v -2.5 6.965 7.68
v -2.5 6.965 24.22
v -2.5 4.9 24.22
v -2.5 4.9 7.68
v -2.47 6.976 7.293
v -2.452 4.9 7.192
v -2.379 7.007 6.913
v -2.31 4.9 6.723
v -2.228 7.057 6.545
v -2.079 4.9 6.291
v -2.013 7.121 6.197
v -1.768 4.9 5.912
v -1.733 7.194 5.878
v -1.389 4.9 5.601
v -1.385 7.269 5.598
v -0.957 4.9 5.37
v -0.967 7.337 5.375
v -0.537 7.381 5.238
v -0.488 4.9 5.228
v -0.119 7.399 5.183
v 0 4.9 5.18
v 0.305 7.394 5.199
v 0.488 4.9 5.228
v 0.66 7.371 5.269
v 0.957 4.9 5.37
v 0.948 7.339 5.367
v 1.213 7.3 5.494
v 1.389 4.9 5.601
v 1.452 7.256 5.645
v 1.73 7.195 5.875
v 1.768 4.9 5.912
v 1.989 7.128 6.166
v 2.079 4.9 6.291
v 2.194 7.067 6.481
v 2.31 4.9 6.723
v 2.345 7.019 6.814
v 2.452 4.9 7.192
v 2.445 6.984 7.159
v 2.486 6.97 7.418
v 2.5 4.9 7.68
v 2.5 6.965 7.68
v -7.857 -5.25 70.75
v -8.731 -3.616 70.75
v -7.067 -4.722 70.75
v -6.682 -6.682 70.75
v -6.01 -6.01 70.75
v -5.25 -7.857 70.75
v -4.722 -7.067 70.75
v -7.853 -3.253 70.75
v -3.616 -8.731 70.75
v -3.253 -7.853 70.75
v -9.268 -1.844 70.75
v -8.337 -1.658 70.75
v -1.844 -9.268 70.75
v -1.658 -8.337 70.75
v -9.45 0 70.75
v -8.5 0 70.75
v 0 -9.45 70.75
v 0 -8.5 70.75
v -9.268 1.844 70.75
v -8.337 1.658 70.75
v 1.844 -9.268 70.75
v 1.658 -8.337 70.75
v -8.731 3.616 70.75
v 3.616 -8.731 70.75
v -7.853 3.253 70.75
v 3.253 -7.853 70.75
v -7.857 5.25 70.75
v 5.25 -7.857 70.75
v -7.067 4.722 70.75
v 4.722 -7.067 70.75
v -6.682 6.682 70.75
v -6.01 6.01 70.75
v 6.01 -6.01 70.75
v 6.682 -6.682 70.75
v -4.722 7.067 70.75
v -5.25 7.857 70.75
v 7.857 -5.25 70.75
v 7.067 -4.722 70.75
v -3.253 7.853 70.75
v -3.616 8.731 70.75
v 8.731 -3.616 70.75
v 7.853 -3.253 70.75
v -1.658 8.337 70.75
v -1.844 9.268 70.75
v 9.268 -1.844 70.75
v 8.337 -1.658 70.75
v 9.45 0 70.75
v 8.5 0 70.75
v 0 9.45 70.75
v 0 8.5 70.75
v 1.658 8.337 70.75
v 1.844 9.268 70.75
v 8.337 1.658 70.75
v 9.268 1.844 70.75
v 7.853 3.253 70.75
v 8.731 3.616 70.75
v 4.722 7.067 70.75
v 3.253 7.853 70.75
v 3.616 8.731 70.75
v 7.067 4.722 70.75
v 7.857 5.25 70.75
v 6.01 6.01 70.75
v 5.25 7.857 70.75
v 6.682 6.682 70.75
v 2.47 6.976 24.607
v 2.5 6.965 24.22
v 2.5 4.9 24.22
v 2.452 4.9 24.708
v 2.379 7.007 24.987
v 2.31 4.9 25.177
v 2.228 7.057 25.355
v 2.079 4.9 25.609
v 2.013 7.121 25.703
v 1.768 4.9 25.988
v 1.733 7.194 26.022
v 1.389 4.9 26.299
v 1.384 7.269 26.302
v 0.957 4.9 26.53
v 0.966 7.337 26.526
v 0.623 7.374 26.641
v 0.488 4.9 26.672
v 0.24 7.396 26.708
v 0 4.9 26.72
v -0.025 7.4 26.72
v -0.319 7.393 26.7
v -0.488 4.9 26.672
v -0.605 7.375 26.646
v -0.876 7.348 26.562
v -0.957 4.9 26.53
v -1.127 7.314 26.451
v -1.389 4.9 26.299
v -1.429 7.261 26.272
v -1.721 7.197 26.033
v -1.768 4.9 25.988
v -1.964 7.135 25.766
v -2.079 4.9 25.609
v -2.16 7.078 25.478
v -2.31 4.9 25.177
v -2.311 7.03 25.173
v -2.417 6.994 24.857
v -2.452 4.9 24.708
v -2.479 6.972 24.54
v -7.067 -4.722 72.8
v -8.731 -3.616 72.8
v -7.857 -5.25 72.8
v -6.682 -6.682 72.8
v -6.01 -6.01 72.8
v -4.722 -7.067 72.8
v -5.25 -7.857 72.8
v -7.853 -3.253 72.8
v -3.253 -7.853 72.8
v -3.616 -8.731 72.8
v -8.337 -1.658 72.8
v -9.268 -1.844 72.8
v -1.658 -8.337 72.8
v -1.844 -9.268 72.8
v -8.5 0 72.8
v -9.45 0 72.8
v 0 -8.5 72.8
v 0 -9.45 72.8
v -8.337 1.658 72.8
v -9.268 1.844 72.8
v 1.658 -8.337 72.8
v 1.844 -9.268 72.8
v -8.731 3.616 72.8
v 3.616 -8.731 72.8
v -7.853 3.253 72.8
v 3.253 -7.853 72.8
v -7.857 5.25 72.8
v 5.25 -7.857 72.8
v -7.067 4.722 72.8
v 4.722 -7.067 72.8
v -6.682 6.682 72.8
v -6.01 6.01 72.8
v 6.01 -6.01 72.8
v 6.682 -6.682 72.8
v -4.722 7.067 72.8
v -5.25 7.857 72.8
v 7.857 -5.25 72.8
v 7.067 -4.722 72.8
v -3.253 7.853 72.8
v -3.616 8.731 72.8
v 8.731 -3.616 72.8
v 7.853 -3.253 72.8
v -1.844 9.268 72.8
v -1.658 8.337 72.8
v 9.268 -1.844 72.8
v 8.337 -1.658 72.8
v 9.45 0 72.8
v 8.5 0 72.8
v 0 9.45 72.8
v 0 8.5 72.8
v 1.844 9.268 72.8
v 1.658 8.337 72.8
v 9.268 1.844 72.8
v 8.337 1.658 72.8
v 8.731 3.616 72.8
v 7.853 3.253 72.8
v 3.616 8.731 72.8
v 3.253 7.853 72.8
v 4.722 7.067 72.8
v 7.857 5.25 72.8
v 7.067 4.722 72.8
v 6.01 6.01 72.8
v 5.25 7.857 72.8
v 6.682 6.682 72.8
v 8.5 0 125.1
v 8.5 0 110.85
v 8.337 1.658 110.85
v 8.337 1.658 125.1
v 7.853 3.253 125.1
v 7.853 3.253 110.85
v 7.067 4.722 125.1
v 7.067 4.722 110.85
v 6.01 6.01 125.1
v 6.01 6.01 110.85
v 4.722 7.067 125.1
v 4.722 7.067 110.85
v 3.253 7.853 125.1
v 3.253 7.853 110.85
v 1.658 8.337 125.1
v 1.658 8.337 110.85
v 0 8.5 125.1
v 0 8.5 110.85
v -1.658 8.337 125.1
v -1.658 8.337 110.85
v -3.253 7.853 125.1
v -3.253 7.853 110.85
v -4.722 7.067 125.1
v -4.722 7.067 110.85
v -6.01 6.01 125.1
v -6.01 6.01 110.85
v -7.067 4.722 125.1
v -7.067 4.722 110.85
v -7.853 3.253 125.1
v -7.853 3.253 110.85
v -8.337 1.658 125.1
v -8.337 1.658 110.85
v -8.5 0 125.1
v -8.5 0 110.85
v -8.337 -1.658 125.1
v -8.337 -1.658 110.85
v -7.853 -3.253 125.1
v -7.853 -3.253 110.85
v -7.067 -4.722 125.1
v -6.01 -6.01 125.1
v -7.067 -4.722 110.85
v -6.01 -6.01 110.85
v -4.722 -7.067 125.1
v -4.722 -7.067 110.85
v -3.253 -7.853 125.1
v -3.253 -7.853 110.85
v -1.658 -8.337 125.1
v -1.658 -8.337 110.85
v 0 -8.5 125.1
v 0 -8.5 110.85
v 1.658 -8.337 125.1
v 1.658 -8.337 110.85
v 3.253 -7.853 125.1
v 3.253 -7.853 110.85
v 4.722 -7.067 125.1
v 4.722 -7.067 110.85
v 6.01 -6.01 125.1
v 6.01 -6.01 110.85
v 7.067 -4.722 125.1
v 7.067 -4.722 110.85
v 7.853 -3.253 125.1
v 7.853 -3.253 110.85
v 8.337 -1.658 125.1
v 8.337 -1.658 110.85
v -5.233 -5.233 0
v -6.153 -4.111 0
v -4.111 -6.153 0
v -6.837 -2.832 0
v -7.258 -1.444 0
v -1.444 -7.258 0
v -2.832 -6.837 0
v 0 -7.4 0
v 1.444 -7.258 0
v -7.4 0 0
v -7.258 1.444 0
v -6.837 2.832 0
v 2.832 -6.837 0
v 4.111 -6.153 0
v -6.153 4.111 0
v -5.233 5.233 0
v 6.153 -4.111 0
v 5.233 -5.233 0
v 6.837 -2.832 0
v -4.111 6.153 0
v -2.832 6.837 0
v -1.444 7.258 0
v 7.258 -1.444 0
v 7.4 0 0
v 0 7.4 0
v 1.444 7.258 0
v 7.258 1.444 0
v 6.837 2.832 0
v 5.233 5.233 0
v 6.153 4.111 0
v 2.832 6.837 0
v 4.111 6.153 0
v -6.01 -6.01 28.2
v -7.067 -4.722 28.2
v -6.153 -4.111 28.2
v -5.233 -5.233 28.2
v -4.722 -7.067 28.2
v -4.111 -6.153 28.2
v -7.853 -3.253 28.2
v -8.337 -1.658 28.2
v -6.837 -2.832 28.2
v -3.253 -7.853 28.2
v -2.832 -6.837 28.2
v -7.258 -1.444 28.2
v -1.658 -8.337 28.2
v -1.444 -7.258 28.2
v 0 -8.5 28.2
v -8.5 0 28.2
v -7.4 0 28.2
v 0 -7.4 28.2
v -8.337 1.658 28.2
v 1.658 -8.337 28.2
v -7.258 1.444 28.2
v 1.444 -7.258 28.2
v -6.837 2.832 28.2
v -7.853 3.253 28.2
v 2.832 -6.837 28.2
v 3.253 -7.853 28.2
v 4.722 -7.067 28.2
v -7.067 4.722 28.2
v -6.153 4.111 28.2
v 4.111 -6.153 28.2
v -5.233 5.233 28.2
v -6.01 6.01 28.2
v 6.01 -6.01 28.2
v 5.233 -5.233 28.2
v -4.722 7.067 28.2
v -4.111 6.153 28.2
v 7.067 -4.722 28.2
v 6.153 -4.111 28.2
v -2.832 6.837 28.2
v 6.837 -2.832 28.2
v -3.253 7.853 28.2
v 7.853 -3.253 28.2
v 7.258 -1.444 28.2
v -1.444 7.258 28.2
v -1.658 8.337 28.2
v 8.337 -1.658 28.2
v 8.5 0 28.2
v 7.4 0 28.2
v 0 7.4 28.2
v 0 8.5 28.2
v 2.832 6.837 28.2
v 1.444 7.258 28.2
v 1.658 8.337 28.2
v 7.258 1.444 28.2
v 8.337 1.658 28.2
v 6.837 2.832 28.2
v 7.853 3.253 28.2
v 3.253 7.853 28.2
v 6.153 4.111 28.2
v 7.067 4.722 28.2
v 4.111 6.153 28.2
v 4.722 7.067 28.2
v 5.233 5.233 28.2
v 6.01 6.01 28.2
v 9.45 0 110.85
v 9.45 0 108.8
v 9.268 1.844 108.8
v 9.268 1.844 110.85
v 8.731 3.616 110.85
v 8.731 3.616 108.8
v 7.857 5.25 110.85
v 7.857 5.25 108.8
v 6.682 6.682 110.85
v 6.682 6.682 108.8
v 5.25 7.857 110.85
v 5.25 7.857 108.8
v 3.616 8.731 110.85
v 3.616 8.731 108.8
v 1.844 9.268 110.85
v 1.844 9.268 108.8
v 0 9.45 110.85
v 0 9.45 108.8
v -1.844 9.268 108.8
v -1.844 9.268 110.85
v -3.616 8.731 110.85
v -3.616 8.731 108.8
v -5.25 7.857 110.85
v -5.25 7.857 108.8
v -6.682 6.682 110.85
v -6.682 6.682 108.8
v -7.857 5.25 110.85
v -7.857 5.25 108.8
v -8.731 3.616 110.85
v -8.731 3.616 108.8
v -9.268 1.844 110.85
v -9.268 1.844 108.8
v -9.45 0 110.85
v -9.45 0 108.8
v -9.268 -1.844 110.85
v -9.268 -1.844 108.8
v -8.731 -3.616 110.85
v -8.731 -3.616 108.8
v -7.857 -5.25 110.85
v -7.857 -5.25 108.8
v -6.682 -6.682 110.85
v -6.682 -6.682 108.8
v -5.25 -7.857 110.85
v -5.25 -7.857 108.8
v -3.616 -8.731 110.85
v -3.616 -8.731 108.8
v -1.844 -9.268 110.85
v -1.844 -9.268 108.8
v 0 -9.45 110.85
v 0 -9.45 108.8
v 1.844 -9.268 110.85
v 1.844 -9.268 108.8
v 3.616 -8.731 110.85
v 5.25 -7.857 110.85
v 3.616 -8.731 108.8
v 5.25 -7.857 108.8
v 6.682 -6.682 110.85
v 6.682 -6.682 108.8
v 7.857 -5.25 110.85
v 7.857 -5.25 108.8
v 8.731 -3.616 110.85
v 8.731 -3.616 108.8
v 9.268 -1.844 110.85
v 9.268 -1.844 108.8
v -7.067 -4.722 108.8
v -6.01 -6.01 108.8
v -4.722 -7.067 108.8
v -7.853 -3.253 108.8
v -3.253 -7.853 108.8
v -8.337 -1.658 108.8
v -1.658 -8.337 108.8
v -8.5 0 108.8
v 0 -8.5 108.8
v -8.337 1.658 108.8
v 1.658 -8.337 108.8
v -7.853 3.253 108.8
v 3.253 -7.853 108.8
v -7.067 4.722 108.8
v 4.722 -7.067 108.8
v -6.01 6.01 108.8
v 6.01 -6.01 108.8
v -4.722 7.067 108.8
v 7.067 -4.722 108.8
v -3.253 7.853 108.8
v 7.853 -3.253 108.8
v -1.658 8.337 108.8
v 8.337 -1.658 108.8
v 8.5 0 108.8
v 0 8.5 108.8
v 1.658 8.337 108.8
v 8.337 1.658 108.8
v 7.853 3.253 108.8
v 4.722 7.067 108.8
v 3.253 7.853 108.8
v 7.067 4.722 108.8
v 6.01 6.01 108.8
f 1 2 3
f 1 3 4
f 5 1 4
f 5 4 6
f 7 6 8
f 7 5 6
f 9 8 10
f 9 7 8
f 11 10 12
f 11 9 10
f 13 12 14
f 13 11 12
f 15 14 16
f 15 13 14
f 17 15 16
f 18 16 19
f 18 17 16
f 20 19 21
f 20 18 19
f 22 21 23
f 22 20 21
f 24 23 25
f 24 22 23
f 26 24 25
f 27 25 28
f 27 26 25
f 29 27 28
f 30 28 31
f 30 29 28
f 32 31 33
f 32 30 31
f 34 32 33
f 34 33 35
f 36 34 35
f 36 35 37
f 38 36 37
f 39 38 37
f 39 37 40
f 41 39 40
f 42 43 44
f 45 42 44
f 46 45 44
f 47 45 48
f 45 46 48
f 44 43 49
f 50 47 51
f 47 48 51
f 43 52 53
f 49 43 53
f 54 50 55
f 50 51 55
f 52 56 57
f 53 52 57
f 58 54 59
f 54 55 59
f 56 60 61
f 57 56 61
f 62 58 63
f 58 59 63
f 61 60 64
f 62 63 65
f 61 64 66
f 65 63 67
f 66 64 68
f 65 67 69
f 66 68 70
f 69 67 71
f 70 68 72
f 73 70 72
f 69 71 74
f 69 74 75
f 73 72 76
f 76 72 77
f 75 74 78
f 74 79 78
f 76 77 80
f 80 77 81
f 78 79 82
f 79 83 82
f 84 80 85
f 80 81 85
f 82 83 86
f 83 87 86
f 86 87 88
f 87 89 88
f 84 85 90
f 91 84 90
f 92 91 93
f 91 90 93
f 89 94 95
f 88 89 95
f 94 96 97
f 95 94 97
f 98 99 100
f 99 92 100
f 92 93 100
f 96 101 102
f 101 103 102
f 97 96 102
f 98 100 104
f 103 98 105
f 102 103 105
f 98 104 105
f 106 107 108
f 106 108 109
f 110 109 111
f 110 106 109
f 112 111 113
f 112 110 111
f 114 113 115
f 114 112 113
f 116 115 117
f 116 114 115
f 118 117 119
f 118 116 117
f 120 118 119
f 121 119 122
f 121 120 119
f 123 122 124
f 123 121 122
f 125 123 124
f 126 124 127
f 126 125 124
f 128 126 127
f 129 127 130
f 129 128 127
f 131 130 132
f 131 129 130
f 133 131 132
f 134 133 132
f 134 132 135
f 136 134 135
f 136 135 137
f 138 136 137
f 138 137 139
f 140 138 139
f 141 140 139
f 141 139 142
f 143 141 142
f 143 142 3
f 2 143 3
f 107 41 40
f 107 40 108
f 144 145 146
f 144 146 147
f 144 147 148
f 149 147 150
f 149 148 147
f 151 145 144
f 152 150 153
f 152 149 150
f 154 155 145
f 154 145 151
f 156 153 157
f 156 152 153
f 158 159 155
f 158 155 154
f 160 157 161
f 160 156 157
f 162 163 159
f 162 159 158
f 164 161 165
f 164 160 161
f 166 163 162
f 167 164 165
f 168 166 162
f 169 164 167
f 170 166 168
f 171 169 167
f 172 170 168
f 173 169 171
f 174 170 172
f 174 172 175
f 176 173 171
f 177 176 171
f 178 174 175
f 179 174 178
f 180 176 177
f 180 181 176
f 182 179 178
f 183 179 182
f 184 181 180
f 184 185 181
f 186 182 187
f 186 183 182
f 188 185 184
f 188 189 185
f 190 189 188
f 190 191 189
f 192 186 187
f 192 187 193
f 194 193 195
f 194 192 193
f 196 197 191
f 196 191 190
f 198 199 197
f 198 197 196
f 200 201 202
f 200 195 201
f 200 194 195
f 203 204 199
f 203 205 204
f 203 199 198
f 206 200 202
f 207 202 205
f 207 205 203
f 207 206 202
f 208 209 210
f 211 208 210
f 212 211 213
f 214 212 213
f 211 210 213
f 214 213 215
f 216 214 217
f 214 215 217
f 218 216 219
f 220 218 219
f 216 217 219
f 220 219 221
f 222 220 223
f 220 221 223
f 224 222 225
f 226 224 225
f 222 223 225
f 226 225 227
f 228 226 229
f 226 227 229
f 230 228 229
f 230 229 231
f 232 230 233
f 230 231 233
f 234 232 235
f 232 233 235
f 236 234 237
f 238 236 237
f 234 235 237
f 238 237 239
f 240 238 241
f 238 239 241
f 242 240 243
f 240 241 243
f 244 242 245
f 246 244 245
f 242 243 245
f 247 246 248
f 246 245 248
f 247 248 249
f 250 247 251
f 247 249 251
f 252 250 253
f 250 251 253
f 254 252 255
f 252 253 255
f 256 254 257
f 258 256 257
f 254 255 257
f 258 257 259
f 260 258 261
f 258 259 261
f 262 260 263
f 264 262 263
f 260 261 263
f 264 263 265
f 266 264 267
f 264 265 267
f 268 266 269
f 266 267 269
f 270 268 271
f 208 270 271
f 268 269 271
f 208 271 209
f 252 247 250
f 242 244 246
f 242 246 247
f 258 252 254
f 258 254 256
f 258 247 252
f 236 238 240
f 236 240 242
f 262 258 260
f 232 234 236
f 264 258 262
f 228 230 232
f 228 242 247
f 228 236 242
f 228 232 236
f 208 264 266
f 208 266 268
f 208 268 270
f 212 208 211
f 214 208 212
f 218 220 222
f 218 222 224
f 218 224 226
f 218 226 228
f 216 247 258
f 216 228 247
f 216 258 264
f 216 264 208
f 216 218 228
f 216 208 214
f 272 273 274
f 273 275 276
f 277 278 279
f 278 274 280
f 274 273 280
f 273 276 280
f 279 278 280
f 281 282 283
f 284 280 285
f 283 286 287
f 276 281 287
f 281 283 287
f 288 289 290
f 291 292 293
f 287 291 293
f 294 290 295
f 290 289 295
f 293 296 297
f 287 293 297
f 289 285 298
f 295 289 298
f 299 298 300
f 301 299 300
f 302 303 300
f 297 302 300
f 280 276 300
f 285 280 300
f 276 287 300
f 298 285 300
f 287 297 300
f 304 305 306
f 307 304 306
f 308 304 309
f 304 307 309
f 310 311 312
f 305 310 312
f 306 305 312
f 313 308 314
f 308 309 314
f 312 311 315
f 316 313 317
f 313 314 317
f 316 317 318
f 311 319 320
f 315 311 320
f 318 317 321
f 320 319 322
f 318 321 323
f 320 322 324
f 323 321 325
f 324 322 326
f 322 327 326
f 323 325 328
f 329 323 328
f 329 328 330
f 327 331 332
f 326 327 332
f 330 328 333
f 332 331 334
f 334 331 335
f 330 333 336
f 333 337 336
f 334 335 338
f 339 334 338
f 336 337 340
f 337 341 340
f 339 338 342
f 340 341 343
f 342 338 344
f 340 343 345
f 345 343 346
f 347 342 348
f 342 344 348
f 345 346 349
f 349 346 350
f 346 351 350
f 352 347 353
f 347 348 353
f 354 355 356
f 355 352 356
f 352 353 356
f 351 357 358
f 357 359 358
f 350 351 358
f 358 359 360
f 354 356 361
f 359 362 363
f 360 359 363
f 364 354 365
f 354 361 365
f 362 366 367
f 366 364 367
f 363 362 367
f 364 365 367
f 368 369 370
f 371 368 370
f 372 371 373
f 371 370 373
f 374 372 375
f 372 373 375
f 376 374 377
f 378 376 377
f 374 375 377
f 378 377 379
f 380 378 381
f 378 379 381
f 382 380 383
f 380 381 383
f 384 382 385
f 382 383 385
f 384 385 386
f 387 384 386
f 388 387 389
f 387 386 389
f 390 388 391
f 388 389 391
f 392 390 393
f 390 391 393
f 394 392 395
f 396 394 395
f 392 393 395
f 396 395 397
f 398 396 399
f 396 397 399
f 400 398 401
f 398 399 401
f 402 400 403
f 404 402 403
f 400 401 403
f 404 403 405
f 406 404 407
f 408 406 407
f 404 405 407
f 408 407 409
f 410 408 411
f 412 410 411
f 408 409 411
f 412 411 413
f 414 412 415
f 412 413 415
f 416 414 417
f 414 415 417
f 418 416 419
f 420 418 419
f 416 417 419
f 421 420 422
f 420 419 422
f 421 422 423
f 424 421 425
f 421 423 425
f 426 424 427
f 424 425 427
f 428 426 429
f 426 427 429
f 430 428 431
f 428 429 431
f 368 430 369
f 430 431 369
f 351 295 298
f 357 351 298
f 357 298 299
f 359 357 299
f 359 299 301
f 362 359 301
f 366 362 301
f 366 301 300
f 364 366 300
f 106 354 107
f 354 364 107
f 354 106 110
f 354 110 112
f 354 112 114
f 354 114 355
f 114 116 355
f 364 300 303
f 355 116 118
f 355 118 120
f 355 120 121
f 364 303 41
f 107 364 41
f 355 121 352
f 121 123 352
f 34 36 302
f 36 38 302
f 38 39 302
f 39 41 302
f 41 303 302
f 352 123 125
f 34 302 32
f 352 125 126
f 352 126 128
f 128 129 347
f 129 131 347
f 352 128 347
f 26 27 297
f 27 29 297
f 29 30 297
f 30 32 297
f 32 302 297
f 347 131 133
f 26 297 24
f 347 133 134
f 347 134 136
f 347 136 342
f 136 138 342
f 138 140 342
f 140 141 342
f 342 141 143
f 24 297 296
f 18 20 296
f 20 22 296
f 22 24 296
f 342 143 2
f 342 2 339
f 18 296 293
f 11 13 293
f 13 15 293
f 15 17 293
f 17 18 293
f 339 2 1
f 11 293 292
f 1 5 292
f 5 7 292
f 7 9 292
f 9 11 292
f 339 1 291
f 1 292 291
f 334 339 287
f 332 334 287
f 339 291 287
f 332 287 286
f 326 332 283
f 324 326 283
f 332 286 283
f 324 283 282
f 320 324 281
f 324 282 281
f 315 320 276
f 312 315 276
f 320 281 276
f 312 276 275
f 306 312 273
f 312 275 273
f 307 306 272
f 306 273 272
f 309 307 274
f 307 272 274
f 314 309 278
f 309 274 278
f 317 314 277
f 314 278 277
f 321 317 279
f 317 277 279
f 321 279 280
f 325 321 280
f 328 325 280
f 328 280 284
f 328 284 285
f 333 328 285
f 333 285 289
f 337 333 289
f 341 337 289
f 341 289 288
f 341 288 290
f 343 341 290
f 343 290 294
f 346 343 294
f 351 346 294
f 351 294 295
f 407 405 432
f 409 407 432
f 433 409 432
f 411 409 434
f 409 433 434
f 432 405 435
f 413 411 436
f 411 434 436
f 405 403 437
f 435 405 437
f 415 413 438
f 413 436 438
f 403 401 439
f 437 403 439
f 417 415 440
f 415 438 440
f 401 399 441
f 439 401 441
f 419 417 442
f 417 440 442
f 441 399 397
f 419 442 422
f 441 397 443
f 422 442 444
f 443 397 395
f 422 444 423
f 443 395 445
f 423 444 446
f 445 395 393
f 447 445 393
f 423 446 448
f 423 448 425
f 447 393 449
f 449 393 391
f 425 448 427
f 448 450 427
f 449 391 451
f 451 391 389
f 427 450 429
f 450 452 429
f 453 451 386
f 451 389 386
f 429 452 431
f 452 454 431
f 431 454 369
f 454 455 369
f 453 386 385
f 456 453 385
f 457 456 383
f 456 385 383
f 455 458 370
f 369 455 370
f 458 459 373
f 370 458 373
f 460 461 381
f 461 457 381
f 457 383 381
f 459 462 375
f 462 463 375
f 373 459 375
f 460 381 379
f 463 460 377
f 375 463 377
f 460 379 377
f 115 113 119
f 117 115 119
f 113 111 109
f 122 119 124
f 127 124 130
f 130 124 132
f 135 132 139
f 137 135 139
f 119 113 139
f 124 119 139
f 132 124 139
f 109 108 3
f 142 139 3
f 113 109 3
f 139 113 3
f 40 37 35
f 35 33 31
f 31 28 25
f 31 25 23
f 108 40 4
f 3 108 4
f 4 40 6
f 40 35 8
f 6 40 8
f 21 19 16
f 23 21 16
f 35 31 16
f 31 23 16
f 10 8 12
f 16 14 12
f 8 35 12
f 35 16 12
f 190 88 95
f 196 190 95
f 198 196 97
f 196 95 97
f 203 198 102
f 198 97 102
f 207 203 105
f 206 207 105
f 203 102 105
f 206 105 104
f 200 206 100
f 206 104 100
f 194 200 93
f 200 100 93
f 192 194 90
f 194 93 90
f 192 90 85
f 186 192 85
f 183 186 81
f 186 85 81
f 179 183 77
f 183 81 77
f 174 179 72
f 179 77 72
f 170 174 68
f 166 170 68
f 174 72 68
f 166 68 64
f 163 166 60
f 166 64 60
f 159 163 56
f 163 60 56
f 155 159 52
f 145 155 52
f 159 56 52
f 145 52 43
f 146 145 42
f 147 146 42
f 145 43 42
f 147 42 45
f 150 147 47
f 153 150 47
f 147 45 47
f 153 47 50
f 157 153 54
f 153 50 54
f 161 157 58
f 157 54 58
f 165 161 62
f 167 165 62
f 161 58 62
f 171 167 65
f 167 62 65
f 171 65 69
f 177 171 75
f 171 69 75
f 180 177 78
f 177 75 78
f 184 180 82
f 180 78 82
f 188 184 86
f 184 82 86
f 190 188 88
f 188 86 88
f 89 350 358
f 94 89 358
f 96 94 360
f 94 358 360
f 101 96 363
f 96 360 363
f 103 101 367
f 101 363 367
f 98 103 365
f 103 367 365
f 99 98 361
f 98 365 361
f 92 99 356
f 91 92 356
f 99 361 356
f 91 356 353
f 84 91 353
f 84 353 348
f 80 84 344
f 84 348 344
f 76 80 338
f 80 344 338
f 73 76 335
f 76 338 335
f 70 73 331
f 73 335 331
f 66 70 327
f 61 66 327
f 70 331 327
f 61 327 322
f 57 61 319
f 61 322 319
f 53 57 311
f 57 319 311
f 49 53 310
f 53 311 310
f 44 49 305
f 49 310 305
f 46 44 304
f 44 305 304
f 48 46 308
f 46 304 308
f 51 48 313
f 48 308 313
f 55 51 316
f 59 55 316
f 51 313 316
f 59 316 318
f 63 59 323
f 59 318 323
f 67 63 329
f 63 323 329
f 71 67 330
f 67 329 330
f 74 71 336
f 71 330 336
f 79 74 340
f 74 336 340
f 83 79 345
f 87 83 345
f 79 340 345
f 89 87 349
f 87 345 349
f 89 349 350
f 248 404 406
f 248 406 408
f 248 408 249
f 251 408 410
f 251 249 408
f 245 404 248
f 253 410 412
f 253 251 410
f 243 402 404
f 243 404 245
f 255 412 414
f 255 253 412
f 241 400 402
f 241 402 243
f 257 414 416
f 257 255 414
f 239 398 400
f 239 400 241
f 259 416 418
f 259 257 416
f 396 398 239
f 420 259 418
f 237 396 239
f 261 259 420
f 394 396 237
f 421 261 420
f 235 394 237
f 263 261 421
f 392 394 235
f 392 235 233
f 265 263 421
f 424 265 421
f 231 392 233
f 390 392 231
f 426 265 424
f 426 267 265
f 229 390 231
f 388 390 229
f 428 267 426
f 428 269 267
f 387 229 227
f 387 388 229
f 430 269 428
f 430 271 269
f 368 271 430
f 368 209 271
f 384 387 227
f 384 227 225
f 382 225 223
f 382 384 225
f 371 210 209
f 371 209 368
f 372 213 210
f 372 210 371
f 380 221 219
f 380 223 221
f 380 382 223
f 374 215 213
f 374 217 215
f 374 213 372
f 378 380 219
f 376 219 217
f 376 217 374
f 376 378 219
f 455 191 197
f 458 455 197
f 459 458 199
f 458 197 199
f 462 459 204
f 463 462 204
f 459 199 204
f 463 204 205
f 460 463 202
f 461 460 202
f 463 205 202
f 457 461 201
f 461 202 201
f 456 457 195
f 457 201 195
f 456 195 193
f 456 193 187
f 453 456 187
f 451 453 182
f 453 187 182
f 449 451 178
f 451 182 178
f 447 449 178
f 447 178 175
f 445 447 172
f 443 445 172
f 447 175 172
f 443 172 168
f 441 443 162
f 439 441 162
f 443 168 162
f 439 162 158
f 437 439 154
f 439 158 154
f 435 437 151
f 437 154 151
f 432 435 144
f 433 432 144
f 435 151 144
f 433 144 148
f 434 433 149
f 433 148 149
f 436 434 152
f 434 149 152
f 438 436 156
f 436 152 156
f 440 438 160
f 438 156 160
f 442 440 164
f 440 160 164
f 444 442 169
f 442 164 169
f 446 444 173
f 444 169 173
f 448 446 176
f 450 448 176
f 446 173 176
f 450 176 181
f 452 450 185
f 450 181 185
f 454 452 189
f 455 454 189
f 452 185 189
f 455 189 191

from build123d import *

# Parameters (mm, degrees)
SKETCH_1_R          = 7.4
EXTRUDE_1_DEPTH     = 28.2
EXTRUDE_START       = 28.2
SKETCH_1_5_R        = 8.5
EXTRUDE_2_DEPTH     = 42.55
EXTRUDE_START_2     = 70.75
SKETCH_1_7_R        = 9.45
EXTRUDE_3_DEPTH     = 2.05
EXTRUDE_START_3     = 108.8
SKETCH_1_8_R        = 9.45
EXTRUDE_4_DEPTH     = 2.05
EXTRUDE_START_4     = 72.8
SKETCH_1_9_R        = 8.5
EXTRUDE_5_DEPTH     = 36
EXTRUDE_START_5     = 110.85
SKETCH_1_10_R       = 8.5
EXTRUDE_6_DEPTH     = 14.25
CUT_EXTRUDE_START   = 7.4
CUT_EXTRUDE_1_DEPTH = 2.5


with BuildPart() as part:
    # 草图1 → 凸台-拉伸1 (new body)
    with BuildSketch(Plane.XY):
        Circle(SKETCH_1_R)
    extrude(amount=EXTRUDE_1_DEPTH)

    # 草图1<5> → 凸台-拉伸2 (add)
    with BuildSketch(Plane.XY.offset(EXTRUDE_START)):
        Circle(SKETCH_1_5_R)
    extrude(amount=EXTRUDE_2_DEPTH)

    # 草图1<7> → 凸台-拉伸3 (add)
    with BuildSketch(Plane.XY.offset(EXTRUDE_START_2)):
        Circle(SKETCH_1_7_R)
    extrude(amount=EXTRUDE_3_DEPTH)



with BuildPart() as body_2:
    # 草图1<8> → 凸台-拉伸4 (new body)
    with BuildSketch(Plane.XY.offset(EXTRUDE_START_3)):
        Circle(SKETCH_1_8_R)
    extrude(amount=EXTRUDE_4_DEPTH)


with BuildPart() as part_1:
    add(part.part)

    add(body_2.part)  # 凸台-拉伸5 merges body 2
    # 草图1<9> → 凸台-拉伸5 (add)
    with BuildSketch(Plane.XY.offset(EXTRUDE_START_4)):
        Circle(SKETCH_1_9_R)
    extrude(amount=EXTRUDE_5_DEPTH)

    # 草图1<10> → 凸台-拉伸6 (add)
    with BuildSketch(Plane.XY.offset(EXTRUDE_START_5)):
        Circle(SKETCH_1_10_R)
    extrude(amount=EXTRUDE_6_DEPTH)

    # 草图11 → 切除-拉伸1 (cut)
    with BuildSketch(Plane(origin=(0, 0, 0), x_dir=(1, 0, 0), z_dir=(0, 1, 0)).offset(CUT_EXTRUDE_START)):
        with BuildLine():
            Line((2.5, -7.68), (2.5, -24.22))
            ThreePointArc((2.5, -24.22), (0, -26.72), (-2.5, -24.22))
            Line((-2.5, -24.22), (-2.5, -7.68))
            ThreePointArc((-2.5, -7.68), (0, -5.18), (2.5, -7.68))
        make_face()
    extrude(amount=-CUT_EXTRUDE_1_DEPTH, mode=Mode.SUBTRACT)


solid = part_1.part
